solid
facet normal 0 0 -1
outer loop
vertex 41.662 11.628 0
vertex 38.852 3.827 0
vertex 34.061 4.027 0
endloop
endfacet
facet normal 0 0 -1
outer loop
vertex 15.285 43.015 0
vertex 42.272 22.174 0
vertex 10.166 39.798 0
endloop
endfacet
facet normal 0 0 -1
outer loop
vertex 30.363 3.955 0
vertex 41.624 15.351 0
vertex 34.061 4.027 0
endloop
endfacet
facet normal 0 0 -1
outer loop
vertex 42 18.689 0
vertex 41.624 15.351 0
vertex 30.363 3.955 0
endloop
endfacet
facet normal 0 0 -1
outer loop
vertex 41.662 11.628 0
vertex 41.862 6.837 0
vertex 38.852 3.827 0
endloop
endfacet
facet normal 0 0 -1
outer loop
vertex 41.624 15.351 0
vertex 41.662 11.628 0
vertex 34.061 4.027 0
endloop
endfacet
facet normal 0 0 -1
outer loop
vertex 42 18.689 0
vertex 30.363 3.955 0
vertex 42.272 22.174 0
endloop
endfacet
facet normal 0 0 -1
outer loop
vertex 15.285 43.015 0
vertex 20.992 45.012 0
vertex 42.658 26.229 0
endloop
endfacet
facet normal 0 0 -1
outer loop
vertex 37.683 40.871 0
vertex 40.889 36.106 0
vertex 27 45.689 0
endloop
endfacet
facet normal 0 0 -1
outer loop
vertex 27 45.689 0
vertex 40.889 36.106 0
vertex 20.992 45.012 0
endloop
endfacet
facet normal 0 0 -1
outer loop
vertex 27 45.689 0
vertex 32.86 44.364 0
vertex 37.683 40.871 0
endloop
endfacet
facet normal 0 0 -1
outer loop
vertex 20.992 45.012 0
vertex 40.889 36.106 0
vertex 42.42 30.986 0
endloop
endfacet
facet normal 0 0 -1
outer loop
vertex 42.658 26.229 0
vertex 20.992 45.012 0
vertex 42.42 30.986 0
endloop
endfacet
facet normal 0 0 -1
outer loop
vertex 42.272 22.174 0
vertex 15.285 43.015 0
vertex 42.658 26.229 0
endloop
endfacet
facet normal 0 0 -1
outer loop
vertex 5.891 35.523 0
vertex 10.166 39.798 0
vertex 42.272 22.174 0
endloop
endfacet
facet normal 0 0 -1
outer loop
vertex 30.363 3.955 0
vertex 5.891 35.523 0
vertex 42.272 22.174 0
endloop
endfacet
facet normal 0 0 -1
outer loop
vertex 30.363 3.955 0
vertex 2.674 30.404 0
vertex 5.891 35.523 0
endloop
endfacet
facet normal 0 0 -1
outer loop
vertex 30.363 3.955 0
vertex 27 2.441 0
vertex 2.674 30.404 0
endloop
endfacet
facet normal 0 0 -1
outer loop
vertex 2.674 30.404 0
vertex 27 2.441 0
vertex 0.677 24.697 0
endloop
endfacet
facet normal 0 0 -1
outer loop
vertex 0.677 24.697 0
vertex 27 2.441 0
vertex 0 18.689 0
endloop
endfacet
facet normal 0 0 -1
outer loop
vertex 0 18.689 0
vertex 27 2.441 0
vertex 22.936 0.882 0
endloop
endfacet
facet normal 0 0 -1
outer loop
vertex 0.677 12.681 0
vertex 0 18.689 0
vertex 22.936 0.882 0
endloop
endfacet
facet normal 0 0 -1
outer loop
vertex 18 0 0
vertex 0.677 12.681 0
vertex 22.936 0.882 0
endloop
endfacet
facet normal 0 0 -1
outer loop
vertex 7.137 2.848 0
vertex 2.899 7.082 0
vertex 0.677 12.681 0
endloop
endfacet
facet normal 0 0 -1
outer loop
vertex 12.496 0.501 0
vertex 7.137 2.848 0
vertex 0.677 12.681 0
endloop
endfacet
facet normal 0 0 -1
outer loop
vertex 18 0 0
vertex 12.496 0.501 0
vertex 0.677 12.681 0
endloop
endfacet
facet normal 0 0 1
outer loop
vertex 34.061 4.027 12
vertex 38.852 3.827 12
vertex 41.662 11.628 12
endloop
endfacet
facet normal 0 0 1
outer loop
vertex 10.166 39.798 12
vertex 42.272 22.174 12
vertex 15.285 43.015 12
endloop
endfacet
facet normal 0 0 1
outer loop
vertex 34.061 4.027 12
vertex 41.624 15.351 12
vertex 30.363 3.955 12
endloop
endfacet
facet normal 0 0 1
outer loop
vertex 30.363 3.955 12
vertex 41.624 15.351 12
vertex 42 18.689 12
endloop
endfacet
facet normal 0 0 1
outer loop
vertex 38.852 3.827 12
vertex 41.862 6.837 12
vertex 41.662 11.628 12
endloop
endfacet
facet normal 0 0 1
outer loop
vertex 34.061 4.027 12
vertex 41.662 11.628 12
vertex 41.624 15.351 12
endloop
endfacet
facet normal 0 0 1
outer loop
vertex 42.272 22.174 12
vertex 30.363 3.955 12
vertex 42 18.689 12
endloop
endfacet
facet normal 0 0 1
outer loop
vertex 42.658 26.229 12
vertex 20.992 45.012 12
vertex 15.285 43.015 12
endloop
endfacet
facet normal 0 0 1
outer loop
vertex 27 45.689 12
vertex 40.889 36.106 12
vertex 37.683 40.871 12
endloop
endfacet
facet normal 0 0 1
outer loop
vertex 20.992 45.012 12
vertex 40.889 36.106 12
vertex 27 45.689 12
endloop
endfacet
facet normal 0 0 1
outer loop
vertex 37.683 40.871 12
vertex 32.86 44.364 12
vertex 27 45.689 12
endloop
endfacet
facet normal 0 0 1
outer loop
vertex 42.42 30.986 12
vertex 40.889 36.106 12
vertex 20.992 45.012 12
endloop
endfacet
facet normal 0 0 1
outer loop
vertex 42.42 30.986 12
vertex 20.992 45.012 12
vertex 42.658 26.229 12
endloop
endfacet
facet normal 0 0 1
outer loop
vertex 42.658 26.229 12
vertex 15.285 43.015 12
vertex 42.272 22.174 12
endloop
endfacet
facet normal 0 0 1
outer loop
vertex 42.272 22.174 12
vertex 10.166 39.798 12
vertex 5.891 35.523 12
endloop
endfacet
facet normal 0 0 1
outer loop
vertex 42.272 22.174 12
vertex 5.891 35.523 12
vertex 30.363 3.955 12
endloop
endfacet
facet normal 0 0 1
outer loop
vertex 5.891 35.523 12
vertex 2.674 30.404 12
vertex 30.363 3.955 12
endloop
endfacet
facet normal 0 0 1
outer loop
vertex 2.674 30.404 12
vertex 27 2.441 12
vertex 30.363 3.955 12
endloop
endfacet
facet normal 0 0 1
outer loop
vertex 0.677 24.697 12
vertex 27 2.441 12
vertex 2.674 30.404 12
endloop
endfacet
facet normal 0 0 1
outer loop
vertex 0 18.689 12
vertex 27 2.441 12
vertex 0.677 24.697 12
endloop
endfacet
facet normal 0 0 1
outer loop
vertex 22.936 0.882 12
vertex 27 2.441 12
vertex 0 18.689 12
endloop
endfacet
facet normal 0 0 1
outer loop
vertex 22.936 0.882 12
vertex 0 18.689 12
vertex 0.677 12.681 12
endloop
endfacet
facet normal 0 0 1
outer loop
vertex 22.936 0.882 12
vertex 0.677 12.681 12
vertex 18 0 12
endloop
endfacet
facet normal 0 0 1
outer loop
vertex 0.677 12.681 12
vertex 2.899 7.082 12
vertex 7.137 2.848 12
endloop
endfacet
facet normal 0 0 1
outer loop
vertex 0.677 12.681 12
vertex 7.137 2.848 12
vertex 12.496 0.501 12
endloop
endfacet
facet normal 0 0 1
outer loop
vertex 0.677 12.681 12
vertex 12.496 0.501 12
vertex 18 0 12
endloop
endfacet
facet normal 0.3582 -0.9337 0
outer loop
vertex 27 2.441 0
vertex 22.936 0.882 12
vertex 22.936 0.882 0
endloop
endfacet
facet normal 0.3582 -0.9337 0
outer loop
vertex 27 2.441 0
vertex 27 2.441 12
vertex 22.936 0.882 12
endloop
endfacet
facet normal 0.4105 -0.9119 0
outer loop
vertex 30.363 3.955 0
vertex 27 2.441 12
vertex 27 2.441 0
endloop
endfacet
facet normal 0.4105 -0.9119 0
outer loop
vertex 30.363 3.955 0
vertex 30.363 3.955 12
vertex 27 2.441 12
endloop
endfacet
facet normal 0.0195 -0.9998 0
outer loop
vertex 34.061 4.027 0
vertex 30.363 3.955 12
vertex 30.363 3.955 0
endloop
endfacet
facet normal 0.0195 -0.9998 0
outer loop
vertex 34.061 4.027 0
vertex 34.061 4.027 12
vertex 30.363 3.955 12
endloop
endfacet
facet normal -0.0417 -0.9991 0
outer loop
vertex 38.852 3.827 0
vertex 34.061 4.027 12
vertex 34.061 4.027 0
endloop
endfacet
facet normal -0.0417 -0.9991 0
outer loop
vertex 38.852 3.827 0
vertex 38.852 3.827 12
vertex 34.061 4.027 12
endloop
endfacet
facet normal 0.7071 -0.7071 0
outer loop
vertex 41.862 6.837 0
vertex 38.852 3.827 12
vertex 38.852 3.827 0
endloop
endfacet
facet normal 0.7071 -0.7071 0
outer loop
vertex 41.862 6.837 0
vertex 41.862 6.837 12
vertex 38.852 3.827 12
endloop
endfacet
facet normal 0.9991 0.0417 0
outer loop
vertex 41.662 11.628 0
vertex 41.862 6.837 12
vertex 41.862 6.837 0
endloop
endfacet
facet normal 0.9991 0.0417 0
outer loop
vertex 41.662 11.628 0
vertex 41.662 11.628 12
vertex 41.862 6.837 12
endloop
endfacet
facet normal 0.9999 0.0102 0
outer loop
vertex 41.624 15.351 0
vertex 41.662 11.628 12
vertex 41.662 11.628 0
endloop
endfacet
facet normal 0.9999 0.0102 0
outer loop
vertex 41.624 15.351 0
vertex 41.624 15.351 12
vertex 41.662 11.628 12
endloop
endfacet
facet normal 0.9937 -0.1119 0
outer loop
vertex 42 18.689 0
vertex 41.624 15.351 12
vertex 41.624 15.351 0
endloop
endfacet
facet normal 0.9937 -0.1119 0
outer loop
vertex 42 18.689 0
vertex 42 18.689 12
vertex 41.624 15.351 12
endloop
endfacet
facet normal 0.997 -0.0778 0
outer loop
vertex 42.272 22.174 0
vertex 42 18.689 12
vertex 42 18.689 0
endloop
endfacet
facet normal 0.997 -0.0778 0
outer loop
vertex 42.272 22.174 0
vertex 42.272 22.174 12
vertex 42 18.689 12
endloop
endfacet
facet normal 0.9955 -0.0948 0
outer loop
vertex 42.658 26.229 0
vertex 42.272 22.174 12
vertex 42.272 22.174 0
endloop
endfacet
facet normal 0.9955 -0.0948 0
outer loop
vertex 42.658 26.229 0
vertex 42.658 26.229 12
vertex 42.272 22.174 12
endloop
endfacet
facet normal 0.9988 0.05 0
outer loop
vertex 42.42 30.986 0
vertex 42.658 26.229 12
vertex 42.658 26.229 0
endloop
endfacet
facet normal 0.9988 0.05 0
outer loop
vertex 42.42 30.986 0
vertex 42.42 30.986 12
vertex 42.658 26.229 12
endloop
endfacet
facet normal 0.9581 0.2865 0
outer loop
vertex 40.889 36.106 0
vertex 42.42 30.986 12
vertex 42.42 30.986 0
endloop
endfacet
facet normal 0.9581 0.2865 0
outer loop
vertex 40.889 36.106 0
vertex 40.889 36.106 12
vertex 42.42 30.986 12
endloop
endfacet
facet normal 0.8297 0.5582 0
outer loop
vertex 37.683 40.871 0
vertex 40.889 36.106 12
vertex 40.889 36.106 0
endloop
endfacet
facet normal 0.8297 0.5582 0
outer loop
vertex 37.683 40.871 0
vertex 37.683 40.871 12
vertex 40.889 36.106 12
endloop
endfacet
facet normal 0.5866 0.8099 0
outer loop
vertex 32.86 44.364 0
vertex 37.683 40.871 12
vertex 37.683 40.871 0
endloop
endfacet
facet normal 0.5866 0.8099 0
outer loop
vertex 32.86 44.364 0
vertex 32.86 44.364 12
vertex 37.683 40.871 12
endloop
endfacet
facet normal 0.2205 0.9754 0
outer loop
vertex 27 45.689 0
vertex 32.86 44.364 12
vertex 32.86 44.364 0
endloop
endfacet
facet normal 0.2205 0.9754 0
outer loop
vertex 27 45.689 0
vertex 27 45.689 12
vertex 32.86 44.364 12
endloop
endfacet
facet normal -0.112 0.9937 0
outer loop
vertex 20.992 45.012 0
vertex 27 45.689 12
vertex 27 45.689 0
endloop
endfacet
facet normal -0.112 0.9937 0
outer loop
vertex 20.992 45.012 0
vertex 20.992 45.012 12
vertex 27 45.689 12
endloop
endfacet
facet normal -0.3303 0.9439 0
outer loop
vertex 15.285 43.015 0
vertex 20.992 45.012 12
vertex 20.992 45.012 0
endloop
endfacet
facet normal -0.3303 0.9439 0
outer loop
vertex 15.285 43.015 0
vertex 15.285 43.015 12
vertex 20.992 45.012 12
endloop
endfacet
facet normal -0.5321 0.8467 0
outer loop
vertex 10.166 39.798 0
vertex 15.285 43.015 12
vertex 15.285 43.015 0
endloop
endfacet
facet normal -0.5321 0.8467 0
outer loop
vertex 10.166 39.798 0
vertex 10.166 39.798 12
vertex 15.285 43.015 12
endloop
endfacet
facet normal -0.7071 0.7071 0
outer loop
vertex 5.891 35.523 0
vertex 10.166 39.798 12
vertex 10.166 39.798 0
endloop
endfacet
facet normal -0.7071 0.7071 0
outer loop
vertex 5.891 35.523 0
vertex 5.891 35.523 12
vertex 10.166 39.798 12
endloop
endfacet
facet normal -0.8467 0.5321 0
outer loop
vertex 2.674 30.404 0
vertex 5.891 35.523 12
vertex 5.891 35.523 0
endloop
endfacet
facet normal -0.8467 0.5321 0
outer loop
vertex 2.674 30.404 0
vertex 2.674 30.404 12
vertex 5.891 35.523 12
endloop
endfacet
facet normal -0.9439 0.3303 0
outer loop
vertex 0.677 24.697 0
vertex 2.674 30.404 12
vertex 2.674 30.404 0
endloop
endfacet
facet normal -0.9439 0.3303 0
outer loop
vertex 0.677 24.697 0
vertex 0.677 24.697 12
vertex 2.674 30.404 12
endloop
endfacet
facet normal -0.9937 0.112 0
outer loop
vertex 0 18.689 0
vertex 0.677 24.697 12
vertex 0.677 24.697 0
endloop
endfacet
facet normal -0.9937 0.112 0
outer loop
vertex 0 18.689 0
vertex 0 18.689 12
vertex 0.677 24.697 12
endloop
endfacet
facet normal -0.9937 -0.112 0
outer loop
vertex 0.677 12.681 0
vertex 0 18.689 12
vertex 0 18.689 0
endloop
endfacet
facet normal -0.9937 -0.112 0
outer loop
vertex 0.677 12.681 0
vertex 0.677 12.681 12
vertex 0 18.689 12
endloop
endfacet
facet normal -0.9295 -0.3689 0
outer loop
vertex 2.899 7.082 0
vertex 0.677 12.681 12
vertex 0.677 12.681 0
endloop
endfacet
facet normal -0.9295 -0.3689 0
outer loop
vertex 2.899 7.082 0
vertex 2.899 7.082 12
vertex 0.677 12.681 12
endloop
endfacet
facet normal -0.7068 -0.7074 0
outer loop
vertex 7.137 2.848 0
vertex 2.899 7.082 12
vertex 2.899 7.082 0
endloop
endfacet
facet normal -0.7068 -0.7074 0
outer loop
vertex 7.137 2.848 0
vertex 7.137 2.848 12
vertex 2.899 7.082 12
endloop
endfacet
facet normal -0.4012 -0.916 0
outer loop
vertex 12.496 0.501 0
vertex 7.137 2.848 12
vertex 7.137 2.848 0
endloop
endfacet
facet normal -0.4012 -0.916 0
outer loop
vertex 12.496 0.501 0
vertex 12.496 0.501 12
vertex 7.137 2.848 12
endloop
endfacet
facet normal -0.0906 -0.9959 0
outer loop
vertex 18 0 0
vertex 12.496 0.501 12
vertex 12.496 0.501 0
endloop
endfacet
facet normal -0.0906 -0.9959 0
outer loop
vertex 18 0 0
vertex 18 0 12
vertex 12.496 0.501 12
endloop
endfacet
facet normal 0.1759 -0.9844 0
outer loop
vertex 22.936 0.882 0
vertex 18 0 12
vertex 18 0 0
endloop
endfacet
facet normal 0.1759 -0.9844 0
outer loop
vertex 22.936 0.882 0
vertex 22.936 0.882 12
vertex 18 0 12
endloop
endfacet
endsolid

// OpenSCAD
$fn = 32;

// ----------------------------------------------------------------------
// Cam disc: base radius 15.0 mm, lift 12.0 mm, 28 profile points
// ----------------------------------------------------------------------

// --- parameters (mm) ---
profile_height = 12;      // extrusion height
profile_points = 28;      // points of the closed outline

profile = [[42, 18.689], [42.272, 22.174], [42.658, 26.229], [42.42, 30.986], [40.889, 36.106], [37.683, 40.871], [32.86, 44.364], [27, 45.689], [20.992, 45.012], [15.285, 43.015], [10.166, 39.798], [5.891, 35.523], [2.674, 30.404], [0.677, 24.697], [0, 18.689], [0.677, 12.681], [2.899, 7.082], [7.137, 2.848], [12.496, 0.501], [18, 0], [22.936, 0.882], [27, 2.441], [30.363, 3.955], [34.061, 4.027], [38.852, 3.827], [41.862, 6.837], [41.662, 11.628], [41.624, 15.351]];  // single closed polygon, 28 points, counter clockwise

// --- the one profile operation ---
linear_extrude(height = profile_height) polygon(points = profile);
